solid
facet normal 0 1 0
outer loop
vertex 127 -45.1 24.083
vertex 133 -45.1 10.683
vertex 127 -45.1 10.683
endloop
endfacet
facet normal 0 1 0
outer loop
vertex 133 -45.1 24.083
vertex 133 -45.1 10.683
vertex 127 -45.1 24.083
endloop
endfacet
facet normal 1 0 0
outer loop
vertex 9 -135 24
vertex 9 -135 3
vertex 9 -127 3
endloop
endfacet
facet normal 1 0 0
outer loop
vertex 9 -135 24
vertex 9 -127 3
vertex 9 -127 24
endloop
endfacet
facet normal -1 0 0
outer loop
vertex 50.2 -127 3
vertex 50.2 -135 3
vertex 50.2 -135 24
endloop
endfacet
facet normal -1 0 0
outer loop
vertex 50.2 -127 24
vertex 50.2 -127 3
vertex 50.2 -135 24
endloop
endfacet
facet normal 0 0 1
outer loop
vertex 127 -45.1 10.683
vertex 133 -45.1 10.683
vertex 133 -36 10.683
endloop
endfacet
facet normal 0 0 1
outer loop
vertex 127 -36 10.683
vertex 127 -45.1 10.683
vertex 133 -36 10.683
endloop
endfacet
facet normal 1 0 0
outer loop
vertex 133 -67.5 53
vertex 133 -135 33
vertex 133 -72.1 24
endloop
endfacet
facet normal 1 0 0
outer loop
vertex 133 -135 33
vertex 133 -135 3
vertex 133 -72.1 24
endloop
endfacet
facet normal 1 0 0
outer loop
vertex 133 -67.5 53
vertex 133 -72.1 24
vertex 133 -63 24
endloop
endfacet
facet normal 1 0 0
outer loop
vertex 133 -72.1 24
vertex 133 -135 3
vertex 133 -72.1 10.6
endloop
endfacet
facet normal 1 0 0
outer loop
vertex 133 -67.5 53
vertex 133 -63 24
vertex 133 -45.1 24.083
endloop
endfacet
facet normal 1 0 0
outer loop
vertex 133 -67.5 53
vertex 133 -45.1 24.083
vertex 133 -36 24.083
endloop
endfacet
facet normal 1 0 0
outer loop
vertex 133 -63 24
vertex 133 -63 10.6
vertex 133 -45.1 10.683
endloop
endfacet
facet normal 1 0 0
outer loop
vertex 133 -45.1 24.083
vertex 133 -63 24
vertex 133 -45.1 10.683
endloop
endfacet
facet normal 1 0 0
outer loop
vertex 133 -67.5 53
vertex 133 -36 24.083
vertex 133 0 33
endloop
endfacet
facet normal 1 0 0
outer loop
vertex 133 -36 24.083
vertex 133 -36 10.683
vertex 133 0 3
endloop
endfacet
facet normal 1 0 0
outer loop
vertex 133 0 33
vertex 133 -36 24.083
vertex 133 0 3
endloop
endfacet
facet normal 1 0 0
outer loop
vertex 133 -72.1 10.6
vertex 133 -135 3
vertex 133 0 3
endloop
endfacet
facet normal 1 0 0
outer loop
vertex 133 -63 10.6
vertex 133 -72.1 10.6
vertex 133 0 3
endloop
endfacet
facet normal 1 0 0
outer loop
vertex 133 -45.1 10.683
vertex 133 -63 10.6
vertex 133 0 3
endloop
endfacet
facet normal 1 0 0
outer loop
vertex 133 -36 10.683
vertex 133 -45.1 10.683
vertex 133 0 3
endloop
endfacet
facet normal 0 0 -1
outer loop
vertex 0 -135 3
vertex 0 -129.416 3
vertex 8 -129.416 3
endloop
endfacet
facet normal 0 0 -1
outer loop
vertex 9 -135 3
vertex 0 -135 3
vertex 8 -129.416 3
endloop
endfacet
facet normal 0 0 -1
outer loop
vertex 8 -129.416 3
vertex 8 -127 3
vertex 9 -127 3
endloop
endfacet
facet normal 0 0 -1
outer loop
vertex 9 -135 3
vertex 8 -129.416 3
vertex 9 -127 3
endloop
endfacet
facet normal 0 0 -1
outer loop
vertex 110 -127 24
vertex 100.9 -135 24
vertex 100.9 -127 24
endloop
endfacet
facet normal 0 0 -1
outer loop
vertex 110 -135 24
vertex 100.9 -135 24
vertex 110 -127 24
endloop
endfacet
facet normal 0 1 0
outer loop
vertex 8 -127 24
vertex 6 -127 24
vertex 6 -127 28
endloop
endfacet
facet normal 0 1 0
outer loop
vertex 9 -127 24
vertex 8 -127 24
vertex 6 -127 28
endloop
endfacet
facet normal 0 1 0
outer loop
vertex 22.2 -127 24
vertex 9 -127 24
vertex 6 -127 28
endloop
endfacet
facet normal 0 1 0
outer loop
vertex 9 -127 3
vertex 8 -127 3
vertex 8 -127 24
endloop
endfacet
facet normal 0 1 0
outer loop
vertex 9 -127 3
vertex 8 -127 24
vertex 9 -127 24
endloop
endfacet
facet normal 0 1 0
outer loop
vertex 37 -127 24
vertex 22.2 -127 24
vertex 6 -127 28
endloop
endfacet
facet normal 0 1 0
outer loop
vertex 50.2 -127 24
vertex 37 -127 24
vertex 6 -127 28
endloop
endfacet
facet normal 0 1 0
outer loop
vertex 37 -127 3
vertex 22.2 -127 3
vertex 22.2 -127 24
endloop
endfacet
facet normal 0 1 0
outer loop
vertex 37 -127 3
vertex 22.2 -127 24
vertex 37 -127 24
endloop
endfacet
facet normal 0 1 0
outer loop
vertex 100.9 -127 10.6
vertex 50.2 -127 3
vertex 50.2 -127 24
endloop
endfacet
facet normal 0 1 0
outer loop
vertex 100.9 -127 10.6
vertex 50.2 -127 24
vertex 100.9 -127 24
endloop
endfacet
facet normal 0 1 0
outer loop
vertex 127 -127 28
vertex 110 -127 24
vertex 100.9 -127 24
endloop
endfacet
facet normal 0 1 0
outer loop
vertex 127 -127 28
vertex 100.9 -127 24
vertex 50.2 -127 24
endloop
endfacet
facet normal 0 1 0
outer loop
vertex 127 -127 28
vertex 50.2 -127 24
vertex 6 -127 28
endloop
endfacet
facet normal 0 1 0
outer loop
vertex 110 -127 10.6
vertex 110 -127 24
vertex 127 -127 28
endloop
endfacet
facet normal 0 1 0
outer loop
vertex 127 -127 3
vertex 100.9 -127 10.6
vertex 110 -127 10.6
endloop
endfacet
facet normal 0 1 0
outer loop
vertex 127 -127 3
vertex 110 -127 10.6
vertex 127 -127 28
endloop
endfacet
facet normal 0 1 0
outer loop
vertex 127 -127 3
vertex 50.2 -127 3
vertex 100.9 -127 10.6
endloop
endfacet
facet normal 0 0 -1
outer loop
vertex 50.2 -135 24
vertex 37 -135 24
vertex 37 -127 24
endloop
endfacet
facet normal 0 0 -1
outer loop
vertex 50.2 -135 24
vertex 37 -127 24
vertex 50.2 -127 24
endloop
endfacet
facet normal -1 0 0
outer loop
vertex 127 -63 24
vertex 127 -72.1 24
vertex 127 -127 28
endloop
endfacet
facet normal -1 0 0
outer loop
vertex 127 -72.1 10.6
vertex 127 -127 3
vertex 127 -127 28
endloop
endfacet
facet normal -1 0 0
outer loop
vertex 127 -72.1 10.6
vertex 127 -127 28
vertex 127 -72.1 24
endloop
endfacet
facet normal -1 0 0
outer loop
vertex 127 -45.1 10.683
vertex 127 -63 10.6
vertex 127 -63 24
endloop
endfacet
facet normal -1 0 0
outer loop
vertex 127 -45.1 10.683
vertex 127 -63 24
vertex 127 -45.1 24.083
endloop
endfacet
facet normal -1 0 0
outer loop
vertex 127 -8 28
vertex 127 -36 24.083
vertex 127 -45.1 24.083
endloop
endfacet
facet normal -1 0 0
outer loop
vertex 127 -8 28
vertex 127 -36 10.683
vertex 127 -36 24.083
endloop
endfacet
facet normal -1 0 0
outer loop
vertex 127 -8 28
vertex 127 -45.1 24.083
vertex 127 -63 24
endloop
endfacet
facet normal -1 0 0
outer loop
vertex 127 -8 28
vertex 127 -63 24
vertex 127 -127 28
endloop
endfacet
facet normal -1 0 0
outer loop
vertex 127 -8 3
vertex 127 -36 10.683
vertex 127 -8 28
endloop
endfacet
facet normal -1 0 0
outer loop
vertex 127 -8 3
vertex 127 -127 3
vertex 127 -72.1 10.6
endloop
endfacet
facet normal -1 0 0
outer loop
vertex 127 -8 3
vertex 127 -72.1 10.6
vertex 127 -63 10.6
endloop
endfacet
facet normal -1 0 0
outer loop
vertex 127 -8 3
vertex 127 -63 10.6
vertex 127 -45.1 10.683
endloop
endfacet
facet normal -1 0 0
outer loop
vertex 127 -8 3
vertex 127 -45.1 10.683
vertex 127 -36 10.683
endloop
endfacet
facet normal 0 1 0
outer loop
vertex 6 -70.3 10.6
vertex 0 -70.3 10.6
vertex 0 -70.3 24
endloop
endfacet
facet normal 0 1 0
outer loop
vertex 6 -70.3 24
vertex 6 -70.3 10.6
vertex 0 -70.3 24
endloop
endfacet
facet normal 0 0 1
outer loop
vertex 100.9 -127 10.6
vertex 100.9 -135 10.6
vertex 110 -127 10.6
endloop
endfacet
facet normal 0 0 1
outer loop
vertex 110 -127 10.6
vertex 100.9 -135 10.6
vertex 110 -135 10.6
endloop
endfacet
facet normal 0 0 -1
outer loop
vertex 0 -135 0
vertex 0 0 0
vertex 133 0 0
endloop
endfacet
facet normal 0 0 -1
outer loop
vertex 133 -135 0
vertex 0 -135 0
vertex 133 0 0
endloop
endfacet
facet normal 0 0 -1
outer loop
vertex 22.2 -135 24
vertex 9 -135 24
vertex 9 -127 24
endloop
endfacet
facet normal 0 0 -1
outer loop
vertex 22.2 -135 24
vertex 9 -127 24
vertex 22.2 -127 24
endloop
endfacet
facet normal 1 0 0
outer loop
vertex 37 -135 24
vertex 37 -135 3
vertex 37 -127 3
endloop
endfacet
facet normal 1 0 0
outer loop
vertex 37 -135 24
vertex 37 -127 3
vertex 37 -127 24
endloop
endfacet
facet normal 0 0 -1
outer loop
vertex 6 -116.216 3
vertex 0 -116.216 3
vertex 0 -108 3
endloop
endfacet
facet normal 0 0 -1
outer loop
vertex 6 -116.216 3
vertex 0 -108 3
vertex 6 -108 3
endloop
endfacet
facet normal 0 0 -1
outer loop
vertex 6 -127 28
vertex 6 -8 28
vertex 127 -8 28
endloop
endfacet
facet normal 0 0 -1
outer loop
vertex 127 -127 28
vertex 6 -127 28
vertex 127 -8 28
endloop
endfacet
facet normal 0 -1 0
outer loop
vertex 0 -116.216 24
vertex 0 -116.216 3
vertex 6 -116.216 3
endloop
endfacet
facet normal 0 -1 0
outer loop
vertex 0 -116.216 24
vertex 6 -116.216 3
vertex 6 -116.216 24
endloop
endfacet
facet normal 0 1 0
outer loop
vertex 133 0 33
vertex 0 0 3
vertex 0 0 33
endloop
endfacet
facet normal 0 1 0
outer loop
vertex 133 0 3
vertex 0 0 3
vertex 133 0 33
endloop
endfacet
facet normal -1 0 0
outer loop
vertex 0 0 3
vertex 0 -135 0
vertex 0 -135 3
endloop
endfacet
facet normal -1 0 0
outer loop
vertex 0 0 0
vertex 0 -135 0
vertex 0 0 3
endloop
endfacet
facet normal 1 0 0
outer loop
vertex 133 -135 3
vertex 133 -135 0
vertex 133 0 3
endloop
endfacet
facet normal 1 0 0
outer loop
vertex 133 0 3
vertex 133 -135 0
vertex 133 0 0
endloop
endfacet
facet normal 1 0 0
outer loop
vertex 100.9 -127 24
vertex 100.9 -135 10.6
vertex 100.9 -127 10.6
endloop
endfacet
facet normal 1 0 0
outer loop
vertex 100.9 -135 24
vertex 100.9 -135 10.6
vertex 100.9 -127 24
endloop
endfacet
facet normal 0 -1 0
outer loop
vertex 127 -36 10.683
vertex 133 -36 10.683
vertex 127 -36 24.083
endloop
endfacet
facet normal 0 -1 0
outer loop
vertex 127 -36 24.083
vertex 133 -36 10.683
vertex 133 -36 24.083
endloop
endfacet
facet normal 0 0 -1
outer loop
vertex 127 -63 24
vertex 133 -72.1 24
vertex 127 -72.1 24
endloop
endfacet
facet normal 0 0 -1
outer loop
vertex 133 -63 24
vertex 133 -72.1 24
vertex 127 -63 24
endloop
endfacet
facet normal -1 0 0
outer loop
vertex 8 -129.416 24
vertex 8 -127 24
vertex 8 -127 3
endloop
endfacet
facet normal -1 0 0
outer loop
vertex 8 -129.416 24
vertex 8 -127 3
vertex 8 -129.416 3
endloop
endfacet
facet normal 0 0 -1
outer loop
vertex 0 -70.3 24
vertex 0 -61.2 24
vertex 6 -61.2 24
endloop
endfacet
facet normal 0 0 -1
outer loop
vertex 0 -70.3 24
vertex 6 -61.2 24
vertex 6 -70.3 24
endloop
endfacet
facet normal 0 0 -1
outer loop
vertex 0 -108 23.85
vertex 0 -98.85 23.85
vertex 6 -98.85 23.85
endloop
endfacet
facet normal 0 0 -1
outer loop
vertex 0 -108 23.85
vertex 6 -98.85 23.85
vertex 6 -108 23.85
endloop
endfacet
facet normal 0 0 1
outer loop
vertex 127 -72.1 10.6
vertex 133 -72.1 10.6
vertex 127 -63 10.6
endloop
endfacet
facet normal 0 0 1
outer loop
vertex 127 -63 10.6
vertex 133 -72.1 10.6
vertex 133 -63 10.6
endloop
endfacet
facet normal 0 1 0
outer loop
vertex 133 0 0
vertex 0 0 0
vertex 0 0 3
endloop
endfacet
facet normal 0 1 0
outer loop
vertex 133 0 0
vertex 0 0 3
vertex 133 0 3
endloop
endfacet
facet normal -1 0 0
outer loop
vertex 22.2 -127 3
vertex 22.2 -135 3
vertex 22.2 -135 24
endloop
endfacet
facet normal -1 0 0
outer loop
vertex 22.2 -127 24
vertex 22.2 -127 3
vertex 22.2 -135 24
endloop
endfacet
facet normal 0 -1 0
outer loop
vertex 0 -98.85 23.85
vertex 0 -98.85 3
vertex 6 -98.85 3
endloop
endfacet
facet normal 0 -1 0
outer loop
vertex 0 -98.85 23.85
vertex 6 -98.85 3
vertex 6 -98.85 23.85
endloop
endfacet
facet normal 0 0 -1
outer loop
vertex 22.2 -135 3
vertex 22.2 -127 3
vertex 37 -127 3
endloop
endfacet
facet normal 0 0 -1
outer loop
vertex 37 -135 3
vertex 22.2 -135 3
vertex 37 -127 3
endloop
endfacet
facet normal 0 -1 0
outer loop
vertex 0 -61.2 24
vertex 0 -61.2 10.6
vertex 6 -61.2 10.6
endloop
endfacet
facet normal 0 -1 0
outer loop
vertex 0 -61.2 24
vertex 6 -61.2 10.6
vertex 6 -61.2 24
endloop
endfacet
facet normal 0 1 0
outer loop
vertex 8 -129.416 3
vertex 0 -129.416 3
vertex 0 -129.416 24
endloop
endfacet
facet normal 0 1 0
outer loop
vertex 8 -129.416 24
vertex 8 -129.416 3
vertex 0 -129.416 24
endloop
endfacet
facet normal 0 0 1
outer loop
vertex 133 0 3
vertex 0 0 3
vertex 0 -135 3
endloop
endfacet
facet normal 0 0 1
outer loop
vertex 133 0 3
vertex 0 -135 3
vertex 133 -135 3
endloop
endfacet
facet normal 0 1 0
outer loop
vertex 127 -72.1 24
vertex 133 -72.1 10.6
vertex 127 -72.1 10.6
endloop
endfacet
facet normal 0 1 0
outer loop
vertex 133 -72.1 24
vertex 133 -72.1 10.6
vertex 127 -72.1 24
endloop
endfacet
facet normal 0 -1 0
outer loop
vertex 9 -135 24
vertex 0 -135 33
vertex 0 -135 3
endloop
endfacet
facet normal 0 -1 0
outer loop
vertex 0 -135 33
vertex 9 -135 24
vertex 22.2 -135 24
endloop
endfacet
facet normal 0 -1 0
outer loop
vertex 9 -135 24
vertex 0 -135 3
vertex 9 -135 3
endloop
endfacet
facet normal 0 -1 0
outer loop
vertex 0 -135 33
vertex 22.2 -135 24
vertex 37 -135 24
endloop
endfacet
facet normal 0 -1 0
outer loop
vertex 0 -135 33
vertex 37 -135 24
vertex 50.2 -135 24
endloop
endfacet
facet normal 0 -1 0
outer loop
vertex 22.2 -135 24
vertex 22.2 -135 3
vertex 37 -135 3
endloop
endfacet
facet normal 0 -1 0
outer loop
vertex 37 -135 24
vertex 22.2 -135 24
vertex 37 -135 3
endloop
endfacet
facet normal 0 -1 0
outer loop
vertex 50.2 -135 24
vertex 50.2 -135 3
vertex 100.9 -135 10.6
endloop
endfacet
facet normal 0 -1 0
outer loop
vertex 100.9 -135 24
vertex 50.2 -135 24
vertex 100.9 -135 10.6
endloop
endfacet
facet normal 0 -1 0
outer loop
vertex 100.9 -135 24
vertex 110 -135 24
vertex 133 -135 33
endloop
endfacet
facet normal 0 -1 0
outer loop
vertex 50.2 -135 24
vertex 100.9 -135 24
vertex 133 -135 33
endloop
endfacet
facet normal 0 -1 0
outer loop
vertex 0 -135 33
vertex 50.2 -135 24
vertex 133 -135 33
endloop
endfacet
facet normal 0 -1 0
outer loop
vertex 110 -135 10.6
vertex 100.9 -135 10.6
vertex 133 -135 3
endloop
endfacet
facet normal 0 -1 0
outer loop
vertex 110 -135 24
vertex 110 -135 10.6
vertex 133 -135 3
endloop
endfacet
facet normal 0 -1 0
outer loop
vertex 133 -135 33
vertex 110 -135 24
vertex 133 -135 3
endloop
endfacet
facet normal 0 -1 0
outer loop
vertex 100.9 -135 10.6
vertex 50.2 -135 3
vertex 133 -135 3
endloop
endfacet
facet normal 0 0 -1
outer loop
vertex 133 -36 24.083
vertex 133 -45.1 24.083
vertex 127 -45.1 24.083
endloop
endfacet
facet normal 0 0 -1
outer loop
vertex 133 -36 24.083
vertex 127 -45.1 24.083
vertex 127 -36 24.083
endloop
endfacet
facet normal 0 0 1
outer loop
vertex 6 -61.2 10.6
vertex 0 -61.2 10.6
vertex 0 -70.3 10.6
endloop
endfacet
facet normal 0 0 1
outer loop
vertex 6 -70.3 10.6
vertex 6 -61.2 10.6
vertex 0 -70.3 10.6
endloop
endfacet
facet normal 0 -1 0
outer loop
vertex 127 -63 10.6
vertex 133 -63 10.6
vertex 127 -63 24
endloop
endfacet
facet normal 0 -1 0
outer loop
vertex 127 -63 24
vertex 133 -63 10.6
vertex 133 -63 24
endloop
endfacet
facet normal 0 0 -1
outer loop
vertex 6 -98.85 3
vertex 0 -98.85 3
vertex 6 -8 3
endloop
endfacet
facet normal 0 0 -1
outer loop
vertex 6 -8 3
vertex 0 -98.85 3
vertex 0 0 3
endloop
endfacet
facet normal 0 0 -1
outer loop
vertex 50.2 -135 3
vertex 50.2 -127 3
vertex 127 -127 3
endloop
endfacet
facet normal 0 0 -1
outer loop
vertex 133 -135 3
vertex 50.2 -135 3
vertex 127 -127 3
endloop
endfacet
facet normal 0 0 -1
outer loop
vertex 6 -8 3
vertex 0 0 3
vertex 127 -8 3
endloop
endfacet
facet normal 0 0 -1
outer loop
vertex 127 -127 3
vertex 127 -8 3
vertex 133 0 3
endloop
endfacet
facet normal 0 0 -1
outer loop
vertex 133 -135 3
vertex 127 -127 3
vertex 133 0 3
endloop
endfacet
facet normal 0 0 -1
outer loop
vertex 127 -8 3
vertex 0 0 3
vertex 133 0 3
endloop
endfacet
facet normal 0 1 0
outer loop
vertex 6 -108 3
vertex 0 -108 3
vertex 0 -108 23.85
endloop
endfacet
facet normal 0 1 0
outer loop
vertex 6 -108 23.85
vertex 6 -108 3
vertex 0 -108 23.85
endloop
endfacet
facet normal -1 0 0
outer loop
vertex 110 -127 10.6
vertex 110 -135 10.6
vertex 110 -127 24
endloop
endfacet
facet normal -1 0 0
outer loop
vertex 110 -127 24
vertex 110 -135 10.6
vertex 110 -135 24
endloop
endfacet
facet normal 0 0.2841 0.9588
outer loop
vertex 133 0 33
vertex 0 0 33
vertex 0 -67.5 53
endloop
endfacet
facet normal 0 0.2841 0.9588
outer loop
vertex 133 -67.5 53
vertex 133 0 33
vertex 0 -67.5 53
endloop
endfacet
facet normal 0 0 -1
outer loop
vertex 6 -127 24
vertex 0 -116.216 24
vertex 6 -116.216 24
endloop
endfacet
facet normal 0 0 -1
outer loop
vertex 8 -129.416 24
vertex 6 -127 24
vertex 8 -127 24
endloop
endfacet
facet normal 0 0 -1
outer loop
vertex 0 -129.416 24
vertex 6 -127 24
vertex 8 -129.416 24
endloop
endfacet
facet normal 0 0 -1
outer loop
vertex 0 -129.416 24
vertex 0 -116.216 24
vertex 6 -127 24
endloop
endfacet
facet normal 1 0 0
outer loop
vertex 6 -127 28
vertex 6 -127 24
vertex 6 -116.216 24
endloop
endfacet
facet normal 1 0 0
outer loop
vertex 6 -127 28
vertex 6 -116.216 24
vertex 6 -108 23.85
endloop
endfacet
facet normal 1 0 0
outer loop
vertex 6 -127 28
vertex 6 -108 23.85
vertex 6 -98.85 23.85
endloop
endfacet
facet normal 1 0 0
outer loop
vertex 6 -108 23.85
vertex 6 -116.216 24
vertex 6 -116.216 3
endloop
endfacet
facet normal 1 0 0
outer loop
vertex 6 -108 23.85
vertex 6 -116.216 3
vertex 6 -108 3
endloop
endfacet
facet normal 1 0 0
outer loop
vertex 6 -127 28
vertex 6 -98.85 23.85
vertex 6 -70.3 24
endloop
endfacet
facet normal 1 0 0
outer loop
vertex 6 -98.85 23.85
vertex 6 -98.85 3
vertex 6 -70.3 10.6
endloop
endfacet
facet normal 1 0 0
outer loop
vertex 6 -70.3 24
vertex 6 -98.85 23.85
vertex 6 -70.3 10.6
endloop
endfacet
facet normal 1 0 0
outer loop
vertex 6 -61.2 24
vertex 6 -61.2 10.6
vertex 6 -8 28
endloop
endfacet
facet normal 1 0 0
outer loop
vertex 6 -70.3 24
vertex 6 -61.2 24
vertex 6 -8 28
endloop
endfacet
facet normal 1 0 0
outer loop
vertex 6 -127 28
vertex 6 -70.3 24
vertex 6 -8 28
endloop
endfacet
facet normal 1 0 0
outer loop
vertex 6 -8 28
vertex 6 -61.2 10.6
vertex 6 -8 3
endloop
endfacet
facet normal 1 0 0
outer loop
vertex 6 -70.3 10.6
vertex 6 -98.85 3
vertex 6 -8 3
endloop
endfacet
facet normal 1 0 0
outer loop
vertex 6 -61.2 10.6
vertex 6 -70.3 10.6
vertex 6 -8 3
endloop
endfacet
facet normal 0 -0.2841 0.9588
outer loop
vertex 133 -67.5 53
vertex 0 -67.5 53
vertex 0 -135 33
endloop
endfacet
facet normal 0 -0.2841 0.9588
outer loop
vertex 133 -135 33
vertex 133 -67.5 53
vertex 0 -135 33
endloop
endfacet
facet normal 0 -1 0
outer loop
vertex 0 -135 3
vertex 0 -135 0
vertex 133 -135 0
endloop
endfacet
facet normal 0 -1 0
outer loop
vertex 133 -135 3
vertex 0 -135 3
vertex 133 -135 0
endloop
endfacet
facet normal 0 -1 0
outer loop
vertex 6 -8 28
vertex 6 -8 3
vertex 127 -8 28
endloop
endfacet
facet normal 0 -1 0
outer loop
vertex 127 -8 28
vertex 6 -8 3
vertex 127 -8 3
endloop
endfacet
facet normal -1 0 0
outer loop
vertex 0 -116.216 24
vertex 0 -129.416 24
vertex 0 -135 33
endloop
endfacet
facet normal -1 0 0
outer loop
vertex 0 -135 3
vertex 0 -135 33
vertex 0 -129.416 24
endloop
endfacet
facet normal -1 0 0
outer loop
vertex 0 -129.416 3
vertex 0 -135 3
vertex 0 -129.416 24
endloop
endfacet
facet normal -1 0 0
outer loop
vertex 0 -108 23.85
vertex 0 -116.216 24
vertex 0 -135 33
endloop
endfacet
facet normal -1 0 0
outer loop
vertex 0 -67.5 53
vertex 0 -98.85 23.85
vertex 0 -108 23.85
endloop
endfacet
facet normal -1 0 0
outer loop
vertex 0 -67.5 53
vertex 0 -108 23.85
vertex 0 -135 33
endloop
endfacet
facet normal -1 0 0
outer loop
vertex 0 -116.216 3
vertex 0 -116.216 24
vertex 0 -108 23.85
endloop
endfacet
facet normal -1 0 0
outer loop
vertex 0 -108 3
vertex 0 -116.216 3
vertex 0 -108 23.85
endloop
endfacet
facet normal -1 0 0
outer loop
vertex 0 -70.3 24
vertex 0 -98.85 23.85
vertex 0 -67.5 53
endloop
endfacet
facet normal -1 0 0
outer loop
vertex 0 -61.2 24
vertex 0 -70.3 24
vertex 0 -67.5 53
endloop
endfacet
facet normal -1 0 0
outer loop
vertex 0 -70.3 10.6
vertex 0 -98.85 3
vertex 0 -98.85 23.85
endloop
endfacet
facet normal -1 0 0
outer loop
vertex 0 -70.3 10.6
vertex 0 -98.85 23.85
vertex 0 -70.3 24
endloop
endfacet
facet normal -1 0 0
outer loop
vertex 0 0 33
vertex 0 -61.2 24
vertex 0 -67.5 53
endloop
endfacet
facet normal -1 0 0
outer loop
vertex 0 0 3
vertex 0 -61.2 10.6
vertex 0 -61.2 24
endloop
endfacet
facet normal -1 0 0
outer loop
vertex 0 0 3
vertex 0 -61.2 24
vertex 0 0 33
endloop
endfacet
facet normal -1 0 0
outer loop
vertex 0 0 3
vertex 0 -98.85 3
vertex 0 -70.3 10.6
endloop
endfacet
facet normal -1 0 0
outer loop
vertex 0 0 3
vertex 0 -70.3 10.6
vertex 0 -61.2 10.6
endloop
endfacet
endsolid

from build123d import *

# Parameters (mm, degrees)
F0_W      = 133
F0_H      = 135
F1_DEPTH  = 3
F2_W      = 133
F2_H      = 135
F2_W_2    = 121
F2_H_2    = 119
F3_DEPTH  = 25
F5_W      = 9.1
F5_H      = 13.4
F6_DEPTH  = 25
F7_W      = 9.15
F7_H      = 20.85
F8_DEPTH  = 8
F9_W      = 13.2
F9_H      = 21
F10_DEPTH = 8
F11_W     = 9.1
F11_H     = 13.4
F12_DEPTH = 8
F13_W     = 9.1
F13_H     = 13.4
F15_DEPTH = 8
F16_W     = 9.1
F16_H     = 13.4
F16_W_2   = 13.2
F16_H_2   = 21
F17_DEPTH = 8
F18_W     = 133
F18_H     = 135
F19_DEPTH = 25
F21_DEPTH = 133.001


with BuildPart() as f1:
    # F0 (on Top) → F1 (new body)
    with BuildSketch(Plane.XY):
        with Locations((66.5, -67.5)):
            Rectangle(F0_W, F0_H)
    extrude(amount=F1_DEPTH)


with BuildPart() as f3:
    # F2 (on face) → F3 (new body)
    with BuildSketch(Plane.XY.offset(3)):
        with Locations((66.5, -67.5)):
            Rectangle(F2_W, F2_H)
        with Locations((66.5, -67.5)):
            Rectangle(F2_W_2, F2_H_2, mode=Mode.SUBTRACT)
    extrude(amount=F3_DEPTH)

    # F5 (on face) → F6 (cut)
    with BuildSketch(Plane(origin=(0, 0, 0), x_dir=(0, -1, 0), z_dir=(-1, 0, 0))):
        with Locations((65.75, 17.3)):
            Rectangle(F5_W, F5_H)
    extrude(amount=-F6_DEPTH, mode=Mode.SUBTRACT)

    # F7 (on face) → F8 (cut)
    with BuildSketch(Plane(origin=(0, 0, 0), x_dir=(0, -1, 0), z_dir=(-1, 0, 0))):
        with Locations((103.425, 13.425)):
            Rectangle(F7_W, F7_H)
    extrude(amount=-F8_DEPTH, mode=Mode.SUBTRACT)

    # F9 (on face) → F10 (cut)
    with BuildSketch(Plane(origin=(0, 0, 0), x_dir=(0, -1, 0), z_dir=(-1, 0, 0))):
        with Locations((122.815568, 13.5)):
            Rectangle(F9_W, F9_H)
    extrude(amount=-F10_DEPTH, mode=Mode.SUBTRACT)

    # F11 (on face) → F12 (cut)
    with BuildSketch(Plane.YZ.offset(133)):
        with Locations((-67.55, 17.3)):
            Rectangle(F11_W, F11_H)
    extrude(amount=-F12_DEPTH, mode=Mode.SUBTRACT)

    # F13 (on face) → F15 (cut)
    with BuildSketch(Plane.YZ.offset(133)):
        with Locations((-40.55, 17.38312)):
            Rectangle(F13_W, F13_H)
    extrude(amount=-F15_DEPTH, mode=Mode.SUBTRACT)

    # F16 (on face) → F17 (cut)
    with BuildSketch(Plane.XZ.offset(135)):
        with Locations((105.45, 17.3)):
            Rectangle(F16_W, F16_H)
        with Locations((43.6, 13.5)):
            Rectangle(F16_W_2, F16_H_2)
        with Locations((15.6, 13.5)):
            Rectangle(F16_W_2, F16_H_2)
    extrude(amount=-F17_DEPTH, mode=Mode.SUBTRACT)

    # F18 (on face) → F19 (join)
    with BuildSketch(Plane.XY.offset(28)):
        with Locations((66.5, -67.5)):
            Rectangle(F18_W, F18_H)
    extrude(amount=F19_DEPTH)

    # F20 (on face) → F21 (cut, through all)
    with BuildSketch(Plane(origin=(0, 0, 0), x_dir=(0, -1, 0), z_dir=(-1, 0, 0))):
        Polygon((135, 53), (67.5, 53), (135, 33), align=None)
        Polygon((0, 33), (67.5, 53), (0, 53), align=None)
    extrude(amount=-F21_DEPTH, mode=Mode.SUBTRACT)


solid = Compound([f1.part, f3.part])
